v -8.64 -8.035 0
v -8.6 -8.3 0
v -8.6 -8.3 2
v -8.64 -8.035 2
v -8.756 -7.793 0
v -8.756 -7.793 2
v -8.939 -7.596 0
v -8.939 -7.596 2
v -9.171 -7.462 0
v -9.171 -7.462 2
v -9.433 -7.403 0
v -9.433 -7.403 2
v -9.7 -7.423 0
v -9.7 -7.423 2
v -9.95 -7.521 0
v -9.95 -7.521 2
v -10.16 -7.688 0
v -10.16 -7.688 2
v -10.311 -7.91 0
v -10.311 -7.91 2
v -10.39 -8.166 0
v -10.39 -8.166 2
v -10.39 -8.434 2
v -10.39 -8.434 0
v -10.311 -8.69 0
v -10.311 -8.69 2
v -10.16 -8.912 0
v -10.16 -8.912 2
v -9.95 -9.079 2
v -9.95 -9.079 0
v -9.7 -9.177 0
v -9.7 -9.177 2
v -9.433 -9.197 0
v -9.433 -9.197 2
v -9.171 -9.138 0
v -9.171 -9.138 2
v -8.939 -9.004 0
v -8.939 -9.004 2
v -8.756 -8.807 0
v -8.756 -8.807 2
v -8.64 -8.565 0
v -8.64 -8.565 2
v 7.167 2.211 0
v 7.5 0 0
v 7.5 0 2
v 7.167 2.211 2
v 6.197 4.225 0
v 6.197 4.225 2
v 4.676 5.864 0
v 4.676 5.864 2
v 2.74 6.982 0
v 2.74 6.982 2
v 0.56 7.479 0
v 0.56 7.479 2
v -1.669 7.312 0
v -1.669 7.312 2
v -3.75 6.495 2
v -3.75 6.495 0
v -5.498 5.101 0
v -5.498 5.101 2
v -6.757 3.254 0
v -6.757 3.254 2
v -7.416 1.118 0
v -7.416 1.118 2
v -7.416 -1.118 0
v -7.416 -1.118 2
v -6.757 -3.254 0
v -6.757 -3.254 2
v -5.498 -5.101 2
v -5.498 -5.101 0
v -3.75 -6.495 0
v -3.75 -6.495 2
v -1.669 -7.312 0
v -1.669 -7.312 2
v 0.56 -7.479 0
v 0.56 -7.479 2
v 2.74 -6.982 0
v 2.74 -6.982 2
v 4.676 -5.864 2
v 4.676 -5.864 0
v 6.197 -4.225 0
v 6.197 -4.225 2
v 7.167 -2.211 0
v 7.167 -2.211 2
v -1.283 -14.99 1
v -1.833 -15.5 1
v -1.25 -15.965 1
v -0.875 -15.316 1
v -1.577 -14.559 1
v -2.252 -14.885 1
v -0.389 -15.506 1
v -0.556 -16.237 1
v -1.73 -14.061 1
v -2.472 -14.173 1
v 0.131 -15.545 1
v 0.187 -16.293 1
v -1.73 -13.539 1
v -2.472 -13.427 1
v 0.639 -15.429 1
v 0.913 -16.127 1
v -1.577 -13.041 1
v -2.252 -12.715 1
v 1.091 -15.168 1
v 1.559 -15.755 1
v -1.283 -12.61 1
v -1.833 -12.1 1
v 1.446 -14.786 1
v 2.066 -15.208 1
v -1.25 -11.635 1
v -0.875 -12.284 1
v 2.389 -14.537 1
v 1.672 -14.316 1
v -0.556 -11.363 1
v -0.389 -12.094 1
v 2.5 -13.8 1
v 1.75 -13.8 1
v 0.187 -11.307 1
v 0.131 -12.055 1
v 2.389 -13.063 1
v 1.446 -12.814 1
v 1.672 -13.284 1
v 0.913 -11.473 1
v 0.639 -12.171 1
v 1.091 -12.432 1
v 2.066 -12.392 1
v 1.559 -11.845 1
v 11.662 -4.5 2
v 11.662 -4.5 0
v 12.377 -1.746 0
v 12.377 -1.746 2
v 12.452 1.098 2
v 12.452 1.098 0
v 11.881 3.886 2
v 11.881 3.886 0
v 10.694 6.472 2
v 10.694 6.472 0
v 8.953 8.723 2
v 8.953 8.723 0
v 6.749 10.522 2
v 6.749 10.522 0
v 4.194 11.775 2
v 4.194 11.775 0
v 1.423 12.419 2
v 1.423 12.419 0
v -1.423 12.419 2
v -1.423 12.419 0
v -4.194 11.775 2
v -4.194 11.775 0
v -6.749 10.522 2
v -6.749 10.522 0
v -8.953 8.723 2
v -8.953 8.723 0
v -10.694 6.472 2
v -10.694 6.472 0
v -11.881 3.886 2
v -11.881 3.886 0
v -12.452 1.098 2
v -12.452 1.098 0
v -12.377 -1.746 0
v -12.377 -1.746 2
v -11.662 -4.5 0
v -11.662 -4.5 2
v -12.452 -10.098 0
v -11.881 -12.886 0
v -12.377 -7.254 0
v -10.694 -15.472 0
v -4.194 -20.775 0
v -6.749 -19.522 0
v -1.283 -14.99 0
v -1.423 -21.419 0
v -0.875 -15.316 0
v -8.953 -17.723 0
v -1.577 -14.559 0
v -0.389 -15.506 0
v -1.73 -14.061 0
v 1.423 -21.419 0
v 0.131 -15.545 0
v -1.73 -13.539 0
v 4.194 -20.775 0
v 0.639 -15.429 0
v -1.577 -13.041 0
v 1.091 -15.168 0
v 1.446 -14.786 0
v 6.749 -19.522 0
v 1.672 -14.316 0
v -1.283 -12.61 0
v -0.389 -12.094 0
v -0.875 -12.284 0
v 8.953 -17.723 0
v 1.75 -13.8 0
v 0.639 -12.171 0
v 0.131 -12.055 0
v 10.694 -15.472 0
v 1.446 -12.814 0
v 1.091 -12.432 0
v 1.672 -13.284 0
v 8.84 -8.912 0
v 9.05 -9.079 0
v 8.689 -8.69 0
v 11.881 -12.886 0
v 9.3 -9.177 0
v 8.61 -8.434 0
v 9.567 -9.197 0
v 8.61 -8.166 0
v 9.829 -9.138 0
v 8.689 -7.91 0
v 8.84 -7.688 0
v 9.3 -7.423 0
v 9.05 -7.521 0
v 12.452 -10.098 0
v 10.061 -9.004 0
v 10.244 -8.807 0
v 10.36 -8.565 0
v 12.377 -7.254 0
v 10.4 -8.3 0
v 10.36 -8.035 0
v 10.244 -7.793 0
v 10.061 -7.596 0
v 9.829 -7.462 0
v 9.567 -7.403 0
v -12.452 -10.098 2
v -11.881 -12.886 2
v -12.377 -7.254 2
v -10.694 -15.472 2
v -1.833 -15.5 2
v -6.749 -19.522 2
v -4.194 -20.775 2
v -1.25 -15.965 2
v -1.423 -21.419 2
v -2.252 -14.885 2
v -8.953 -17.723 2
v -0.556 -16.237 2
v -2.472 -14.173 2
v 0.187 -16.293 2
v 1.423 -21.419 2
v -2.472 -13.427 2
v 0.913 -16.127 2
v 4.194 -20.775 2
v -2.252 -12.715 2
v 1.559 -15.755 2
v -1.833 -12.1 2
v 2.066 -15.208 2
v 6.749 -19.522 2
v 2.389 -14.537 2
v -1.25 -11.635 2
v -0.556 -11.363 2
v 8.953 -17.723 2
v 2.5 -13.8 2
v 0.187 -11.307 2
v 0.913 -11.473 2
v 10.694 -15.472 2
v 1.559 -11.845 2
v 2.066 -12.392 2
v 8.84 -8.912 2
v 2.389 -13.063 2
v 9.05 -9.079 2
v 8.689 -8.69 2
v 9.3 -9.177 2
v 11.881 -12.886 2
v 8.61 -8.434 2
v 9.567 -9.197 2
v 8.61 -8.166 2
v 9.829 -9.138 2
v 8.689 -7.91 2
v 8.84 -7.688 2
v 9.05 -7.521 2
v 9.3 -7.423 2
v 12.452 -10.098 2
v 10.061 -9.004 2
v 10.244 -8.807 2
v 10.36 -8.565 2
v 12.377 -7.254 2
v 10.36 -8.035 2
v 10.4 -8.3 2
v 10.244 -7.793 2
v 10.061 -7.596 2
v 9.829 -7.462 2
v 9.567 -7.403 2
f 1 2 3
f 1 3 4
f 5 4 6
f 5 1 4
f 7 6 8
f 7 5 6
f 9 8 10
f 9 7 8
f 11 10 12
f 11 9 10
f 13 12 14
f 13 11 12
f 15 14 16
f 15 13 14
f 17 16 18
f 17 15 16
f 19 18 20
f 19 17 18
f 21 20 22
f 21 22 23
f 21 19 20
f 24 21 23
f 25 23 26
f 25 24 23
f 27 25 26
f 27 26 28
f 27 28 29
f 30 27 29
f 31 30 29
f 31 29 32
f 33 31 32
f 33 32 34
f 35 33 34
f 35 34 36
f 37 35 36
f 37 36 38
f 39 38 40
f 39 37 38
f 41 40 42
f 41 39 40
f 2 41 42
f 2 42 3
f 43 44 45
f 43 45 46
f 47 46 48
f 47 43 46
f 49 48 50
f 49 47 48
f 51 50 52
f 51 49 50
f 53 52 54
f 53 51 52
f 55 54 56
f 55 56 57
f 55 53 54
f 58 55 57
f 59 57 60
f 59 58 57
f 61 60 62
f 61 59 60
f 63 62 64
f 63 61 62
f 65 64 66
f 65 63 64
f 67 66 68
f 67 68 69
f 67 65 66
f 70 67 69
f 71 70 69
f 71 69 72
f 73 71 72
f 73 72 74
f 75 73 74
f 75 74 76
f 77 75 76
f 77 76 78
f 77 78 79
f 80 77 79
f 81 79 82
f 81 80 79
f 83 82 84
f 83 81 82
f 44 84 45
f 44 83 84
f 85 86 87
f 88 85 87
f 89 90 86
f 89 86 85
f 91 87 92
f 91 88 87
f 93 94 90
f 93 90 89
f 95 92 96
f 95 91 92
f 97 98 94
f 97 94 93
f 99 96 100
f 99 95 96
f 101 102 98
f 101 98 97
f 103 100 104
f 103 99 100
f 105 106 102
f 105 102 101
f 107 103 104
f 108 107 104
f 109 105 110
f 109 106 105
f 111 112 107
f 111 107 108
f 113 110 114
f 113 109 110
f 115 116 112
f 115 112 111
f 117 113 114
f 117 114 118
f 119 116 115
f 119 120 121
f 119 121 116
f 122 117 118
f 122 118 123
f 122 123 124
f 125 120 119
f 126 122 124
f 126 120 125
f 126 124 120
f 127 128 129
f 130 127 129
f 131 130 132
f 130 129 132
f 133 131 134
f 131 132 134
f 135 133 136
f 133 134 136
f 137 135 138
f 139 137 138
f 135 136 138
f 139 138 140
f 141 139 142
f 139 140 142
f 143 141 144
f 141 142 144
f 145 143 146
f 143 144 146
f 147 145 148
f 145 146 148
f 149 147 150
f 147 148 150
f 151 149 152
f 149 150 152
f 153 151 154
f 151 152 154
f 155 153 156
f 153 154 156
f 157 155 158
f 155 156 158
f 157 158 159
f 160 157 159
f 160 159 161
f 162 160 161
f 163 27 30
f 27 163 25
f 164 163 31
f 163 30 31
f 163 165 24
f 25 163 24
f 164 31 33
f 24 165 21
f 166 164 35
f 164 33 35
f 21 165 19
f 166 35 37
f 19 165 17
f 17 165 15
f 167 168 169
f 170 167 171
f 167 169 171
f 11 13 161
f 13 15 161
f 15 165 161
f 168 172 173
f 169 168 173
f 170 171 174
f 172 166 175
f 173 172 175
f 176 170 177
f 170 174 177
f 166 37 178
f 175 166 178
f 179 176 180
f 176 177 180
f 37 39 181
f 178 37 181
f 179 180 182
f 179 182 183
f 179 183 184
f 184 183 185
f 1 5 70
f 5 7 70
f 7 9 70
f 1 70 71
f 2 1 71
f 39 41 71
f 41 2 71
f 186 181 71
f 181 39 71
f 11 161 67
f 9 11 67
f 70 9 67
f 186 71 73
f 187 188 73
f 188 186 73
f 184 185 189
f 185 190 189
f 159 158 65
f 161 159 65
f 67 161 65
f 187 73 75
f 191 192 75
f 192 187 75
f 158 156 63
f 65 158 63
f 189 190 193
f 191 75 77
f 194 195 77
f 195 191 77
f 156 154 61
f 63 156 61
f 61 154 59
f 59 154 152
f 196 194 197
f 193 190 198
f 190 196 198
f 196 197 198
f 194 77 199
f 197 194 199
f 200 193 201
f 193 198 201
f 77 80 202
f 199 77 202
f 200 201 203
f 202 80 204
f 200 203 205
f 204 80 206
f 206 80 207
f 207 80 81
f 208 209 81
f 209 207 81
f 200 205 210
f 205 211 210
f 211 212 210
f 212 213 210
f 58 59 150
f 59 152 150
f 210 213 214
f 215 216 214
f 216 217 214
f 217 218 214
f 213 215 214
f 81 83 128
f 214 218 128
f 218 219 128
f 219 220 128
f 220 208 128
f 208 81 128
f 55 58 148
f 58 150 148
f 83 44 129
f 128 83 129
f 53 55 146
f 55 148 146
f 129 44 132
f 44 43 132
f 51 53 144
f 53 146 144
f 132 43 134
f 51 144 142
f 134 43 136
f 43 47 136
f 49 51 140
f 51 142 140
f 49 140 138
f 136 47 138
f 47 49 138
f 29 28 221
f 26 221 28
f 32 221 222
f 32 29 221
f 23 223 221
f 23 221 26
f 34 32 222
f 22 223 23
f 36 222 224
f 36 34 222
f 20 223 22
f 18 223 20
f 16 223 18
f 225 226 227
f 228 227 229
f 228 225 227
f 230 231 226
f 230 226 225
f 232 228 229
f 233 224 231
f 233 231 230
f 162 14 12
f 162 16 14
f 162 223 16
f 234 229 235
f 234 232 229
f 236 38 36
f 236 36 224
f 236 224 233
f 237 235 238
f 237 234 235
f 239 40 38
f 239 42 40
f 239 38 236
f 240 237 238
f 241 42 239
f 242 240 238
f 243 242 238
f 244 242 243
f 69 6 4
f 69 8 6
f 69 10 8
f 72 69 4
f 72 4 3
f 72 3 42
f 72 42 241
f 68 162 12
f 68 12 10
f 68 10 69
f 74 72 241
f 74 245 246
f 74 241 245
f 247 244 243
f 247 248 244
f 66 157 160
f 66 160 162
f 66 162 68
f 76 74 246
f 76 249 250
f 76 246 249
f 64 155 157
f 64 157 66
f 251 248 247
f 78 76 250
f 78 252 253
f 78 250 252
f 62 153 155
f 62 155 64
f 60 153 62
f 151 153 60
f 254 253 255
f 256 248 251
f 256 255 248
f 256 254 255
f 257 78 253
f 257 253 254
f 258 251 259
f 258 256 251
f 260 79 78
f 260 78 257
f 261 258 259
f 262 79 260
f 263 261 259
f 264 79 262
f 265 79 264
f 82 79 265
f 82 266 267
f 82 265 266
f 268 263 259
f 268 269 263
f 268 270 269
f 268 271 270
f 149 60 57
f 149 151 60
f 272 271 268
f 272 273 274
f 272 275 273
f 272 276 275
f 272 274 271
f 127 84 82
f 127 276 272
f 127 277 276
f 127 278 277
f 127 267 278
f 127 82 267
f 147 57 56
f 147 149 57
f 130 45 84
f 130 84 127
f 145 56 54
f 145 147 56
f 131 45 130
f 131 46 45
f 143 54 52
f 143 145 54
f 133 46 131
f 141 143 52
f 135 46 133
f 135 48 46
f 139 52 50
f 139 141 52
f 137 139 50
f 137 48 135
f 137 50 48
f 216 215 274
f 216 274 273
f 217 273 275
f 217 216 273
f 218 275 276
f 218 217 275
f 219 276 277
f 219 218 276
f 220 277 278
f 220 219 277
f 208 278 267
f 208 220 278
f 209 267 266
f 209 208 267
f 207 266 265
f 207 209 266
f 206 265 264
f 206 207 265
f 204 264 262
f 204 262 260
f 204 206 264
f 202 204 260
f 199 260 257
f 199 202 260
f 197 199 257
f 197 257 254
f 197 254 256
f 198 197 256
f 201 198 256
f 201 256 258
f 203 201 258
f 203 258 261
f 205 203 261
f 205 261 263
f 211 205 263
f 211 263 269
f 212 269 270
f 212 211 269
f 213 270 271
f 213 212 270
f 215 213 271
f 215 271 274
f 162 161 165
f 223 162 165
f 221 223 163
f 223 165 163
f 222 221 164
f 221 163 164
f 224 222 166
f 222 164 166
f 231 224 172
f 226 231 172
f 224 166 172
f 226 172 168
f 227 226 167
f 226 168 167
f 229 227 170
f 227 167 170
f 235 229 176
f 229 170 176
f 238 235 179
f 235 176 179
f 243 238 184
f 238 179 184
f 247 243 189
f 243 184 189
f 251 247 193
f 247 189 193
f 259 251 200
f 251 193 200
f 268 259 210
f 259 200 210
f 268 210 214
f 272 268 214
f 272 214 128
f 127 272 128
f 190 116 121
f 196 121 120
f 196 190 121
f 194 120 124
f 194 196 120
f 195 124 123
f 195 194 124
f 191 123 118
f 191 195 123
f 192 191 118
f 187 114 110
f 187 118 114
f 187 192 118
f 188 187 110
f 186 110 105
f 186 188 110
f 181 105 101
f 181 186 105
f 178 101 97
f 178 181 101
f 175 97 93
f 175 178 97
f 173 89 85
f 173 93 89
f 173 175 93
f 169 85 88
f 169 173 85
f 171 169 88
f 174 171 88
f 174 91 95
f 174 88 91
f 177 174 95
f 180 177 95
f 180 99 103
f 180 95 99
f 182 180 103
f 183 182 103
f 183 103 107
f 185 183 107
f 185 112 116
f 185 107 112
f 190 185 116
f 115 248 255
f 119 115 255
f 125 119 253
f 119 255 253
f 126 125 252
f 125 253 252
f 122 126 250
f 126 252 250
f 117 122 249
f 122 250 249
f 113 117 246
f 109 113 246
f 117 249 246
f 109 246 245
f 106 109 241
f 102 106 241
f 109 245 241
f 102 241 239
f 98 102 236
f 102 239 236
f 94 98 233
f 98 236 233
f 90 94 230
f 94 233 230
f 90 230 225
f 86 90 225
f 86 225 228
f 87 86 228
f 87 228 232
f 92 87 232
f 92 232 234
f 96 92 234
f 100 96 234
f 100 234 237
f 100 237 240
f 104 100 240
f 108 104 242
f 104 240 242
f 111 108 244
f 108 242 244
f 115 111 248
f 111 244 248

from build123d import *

# Parameters (mm, degrees)
SKETCH_1_R          = 7.5
SKETCH_1_R_2        = 1.75
SKETCH_1_R_3        = 0.9
EXTRUDE_1_DEPTH     = 2
SKETCH_2_R          = 2.5
CUT_EXTRUDE_1_DEPTH = 1


with BuildPart() as part:
    # 草图1 → 凸台-拉伸1 (new body)
    with BuildSketch(Plane.XY):
        with BuildLine():
            ThreePointArc((11.66190379, -4.5), (0, 12.5), (-11.66190379, -4.5))
            ThreePointArc((-11.66190379, -4.5), (0, -21.5), (11.66190379, -4.5))
        make_face()
        Circle(SKETCH_1_R, mode=Mode.SUBTRACT)
        with Locations((0, -13.8)):
            Circle(SKETCH_1_R_2, mode=Mode.SUBTRACT)
        with Locations((-9.5, -8.3)):
            Circle(SKETCH_1_R_3, mode=Mode.SUBTRACT)
        with Locations((9.5, -8.3)):
            Circle(SKETCH_1_R_3, mode=Mode.SUBTRACT)
    extrude(amount=EXTRUDE_1_DEPTH)

    # 草图2 → 切除-拉伸1 (cut)
    with BuildSketch(Plane.XY.offset(2)):
        with Locations((0, -13.8)):
            Circle(SKETCH_2_R)
    extrude(amount=-CUT_EXTRUDE_1_DEPTH, mode=Mode.SUBTRACT)


solid = part.part
